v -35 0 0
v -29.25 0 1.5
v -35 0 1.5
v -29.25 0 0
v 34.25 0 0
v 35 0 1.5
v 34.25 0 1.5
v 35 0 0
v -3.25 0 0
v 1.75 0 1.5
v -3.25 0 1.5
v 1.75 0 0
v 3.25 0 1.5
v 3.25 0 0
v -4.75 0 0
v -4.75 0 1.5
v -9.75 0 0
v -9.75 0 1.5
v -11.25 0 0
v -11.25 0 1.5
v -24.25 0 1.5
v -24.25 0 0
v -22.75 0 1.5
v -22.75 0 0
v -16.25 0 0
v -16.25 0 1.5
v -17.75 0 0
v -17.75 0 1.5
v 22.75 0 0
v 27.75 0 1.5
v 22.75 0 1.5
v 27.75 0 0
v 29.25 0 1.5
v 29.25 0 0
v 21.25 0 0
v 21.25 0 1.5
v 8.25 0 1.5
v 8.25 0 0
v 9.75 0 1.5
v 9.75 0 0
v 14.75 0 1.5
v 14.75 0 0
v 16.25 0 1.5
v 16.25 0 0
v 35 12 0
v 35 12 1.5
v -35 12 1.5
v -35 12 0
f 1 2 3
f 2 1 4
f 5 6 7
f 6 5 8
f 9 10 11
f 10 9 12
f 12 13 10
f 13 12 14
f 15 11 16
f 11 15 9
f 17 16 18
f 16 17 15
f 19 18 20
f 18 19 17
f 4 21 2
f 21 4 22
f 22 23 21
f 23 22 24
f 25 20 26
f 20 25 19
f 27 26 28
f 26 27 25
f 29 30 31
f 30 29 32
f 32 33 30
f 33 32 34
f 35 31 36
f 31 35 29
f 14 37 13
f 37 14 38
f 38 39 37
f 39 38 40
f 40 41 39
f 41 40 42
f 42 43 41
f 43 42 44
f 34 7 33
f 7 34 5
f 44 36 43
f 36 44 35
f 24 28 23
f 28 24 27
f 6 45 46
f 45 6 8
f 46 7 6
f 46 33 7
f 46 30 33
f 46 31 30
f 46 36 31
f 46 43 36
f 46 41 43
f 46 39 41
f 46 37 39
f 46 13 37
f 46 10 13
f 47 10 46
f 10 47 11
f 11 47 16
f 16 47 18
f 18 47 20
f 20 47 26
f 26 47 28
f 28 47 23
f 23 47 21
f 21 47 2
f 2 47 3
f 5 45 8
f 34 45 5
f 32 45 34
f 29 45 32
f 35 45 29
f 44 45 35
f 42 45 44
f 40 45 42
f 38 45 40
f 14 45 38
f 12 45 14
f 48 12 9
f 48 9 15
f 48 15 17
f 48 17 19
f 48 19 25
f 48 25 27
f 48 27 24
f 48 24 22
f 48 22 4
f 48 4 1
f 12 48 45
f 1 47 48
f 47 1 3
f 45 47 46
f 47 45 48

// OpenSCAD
// 10-well comb for agarose gel casting
// Printed lying flat, teeth pointing down (-Y)

$fn = 64;

// ---- Dimensions (mm) ----
plate_t      = 1.5;    // plate thickness (Z)
spine_len    = 70;     // spine length (X)
spine_w      = 12;     // spine width (Y)
tooth_count  = 10;     // number of teeth
tooth_w      = 5.0;    // tooth width (X)
tooth_len    = 12;     // tooth length (Y)
tooth_gap    = 1.5;    // gap between teeth (X)
eps          = 0.5;    // cutter overshoot

pitch = tooth_w + tooth_gap;  // 6.5 mm
x0    = -(tooth_count - 1) * pitch / 2;  // first tooth left edge

difference() {
    // Spine
    translate([-spine_len / 2, 0, 0])
        cube([spine_len, spine_w, plate_t]);

    // Teeth
    for (i = [0 : tooth_count - 1])
        translate([x0 + i * pitch, -tooth_len, 0])
            cube([tooth_w, tooth_len, plate_t + eps]);
}
